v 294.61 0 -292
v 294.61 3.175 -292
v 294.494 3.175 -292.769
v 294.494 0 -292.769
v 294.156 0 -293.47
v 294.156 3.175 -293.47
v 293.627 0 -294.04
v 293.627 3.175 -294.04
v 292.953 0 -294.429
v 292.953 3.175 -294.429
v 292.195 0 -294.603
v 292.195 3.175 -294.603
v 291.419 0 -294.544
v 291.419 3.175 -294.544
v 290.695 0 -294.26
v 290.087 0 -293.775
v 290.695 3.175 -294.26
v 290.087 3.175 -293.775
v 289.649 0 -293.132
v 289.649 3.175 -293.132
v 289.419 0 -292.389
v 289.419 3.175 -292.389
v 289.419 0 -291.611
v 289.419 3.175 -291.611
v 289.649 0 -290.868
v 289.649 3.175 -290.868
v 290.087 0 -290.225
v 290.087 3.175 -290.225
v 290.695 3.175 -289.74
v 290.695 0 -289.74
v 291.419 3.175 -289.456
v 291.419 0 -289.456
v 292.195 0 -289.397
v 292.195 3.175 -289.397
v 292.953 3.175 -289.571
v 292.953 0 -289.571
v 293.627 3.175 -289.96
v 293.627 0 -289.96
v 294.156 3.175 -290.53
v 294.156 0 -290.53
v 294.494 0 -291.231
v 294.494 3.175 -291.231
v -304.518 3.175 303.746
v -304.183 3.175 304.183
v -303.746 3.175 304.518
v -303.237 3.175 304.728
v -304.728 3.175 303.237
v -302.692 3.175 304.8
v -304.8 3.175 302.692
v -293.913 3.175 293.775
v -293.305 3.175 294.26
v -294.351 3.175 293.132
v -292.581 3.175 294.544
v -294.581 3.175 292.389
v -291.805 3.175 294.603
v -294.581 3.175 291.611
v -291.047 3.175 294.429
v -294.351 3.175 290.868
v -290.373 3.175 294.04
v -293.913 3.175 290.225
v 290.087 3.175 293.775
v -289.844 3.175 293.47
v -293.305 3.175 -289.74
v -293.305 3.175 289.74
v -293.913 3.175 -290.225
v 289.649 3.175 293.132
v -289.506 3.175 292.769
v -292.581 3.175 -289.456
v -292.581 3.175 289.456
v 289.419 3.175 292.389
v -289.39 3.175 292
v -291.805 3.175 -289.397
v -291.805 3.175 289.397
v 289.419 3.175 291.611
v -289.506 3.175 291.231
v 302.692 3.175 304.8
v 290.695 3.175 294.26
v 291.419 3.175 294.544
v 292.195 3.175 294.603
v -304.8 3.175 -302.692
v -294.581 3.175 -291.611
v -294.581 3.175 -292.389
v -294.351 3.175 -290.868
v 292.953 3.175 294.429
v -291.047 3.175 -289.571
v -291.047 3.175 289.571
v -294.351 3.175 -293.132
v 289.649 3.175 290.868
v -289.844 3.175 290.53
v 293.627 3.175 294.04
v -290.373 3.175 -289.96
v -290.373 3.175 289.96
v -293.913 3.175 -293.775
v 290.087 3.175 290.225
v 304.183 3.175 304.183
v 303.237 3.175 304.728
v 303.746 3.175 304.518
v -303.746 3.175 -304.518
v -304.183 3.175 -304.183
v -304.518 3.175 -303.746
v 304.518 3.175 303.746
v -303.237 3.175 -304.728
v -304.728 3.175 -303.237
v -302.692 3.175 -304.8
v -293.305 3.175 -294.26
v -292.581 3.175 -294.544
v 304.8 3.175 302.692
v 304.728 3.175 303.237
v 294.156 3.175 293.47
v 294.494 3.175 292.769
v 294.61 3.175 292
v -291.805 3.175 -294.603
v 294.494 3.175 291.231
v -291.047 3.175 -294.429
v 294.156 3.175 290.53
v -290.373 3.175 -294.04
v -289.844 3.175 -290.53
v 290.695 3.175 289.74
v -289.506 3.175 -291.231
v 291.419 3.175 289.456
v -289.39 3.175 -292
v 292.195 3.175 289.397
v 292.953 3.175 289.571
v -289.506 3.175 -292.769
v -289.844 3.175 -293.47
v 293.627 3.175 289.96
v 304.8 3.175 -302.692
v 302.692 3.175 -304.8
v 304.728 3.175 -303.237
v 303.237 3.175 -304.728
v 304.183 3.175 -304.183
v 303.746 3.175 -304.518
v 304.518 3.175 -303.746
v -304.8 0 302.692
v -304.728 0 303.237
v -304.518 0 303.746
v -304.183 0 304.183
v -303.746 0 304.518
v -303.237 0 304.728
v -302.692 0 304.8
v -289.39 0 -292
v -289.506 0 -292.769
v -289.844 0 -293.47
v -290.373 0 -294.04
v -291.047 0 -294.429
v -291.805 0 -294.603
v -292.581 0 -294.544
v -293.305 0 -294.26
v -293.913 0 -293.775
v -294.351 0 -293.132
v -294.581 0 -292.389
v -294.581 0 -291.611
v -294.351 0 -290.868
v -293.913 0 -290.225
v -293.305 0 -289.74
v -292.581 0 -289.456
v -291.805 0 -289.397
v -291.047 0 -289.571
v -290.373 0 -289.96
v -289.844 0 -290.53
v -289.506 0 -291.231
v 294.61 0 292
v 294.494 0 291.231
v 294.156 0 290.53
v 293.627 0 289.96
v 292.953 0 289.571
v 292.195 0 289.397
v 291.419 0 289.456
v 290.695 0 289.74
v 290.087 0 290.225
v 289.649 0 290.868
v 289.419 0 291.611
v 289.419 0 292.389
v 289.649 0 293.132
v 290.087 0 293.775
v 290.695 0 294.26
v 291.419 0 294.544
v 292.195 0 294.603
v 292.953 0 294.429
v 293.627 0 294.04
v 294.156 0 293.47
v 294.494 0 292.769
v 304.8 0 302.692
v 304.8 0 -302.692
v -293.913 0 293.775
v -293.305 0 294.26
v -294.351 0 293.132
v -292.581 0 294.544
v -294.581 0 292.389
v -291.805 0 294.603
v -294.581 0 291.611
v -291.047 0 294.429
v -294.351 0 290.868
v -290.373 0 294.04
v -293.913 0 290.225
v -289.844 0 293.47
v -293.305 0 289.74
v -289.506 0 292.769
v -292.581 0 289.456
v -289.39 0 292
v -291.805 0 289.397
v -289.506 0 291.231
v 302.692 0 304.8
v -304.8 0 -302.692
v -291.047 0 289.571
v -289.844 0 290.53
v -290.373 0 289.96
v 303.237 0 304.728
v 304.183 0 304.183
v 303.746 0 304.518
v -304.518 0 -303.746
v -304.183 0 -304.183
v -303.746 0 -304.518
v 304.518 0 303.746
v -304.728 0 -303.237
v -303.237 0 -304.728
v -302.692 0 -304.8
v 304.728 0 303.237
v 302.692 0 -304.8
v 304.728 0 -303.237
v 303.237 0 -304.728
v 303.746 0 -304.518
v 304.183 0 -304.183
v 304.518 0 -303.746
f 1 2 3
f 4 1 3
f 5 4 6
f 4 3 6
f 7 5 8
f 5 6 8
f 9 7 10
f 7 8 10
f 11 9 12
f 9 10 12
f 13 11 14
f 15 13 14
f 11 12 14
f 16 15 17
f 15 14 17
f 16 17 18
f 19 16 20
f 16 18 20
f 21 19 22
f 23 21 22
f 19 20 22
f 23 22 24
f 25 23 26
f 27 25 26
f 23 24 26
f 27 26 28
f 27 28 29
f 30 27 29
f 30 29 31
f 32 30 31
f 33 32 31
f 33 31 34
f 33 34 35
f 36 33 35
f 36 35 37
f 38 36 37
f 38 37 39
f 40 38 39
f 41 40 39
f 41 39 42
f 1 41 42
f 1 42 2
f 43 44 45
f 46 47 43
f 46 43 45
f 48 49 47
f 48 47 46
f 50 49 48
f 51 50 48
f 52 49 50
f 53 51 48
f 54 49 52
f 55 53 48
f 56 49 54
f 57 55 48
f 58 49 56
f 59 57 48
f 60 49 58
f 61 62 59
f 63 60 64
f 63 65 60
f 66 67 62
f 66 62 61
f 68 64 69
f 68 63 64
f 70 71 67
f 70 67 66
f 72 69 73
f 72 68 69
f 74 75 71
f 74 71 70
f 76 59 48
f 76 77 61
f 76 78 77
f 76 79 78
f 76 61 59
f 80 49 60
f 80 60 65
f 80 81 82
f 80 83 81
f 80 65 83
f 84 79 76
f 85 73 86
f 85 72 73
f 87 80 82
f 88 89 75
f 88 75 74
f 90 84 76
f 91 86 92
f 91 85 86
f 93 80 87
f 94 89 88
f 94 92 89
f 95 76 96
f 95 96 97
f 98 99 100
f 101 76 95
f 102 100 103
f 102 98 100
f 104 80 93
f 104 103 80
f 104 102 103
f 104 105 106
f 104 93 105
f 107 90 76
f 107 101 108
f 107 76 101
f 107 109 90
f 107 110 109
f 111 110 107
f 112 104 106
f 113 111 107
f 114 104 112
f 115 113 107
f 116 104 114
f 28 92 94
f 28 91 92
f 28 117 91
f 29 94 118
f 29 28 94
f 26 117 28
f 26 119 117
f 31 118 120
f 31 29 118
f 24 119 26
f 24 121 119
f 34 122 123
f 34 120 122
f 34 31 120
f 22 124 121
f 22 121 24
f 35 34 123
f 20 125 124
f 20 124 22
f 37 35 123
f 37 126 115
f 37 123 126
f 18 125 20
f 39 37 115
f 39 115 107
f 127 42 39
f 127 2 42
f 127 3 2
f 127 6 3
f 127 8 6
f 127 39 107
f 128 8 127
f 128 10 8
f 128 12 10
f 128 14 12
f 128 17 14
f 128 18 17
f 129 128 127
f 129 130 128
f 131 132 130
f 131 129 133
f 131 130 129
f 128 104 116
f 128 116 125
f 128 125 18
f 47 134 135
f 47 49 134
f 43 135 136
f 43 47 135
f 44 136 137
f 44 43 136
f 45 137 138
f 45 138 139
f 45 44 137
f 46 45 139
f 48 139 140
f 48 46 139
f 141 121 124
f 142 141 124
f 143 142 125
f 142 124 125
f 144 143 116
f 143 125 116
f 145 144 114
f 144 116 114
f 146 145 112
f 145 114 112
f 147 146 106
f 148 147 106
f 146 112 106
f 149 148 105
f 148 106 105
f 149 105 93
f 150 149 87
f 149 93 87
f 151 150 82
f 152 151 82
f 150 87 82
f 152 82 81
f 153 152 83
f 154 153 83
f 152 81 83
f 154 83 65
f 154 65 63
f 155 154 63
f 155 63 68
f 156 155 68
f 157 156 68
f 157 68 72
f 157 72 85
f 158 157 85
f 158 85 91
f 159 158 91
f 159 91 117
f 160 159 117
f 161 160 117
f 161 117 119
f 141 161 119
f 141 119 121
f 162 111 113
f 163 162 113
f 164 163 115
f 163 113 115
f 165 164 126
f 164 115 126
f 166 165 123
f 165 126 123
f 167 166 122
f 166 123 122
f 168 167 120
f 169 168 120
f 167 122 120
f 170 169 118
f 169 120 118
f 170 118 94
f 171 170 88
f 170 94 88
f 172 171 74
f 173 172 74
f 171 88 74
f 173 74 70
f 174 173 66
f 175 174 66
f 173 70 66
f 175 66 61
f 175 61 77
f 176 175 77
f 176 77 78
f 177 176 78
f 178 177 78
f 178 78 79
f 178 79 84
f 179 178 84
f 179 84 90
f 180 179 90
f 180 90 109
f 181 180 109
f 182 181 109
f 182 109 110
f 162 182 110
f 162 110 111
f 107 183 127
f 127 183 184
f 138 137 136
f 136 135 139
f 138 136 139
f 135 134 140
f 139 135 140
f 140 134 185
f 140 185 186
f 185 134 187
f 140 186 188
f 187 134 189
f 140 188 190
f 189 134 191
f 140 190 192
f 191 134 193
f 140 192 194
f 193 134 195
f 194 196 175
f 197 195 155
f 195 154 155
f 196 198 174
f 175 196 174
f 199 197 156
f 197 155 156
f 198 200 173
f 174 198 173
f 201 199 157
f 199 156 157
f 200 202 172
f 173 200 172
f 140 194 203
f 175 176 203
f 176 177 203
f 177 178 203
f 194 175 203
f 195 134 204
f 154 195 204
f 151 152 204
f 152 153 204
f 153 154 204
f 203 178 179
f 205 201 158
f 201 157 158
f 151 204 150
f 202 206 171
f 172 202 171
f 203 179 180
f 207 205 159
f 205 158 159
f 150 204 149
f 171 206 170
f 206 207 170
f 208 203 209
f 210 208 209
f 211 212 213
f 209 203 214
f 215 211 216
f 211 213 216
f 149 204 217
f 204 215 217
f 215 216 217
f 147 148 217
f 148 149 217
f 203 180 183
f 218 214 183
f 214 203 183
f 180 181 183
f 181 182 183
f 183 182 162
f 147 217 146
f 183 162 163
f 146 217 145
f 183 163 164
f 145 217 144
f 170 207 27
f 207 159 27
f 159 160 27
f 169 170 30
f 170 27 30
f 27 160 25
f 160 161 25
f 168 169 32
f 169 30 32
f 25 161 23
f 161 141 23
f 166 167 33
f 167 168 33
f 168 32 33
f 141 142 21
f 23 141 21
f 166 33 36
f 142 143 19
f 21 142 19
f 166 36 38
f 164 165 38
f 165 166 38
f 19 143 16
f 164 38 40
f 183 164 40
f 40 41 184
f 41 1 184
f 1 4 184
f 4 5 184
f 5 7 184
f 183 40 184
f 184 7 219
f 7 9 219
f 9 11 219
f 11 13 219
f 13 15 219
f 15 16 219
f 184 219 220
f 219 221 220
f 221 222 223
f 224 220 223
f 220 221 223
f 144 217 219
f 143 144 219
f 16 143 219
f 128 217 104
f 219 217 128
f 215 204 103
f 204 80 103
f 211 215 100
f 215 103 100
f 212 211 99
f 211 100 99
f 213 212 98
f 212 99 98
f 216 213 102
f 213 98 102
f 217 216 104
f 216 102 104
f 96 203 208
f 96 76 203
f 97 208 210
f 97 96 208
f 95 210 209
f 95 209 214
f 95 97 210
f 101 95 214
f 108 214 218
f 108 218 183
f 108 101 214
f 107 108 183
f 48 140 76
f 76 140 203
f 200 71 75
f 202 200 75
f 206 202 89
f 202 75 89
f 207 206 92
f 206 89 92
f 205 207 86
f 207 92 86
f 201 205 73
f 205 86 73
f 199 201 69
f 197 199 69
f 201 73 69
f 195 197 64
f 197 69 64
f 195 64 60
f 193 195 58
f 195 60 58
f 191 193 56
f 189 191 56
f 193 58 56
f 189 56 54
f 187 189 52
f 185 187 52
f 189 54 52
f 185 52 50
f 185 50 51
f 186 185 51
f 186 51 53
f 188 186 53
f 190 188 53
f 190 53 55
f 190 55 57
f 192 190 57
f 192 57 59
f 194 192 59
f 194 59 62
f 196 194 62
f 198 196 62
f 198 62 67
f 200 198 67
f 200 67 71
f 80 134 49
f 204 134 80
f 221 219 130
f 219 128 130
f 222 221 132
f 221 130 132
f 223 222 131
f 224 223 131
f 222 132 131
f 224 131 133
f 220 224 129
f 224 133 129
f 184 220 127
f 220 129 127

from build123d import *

# Parameters (mm, degrees)
SKETCH1_W                   = 609.6
SKETCH1_H                   = 609.6
SKETCH1_W_2                 = 609.399999892
SKETCH1_H_2                 = 609.399999892
BOSS_EXTRUDE2_DEPTH         = 3.175
F_5_0_2055_DIAMETER_HOLE1_D = 5.2197
FILLET1_R                   = 2.1082


with BuildPart() as part:
    # Sketch1 → Boss-Extrude2 (new body)
    with BuildSketch(Plane(origin=(0, 0, 0), x_dir=(1, 0, 0), z_dir=(0, 1, 0))):
        Rectangle(SKETCH1_W, SKETCH1_H)
        Rectangle(SKETCH1_W_2, SKETCH1_H_2, mode=Mode.SUBTRACT)
        Rectangle(SKETCH1_W_2, SKETCH1_H_2)
    extrude(amount=BOSS_EXTRUDE2_DEPTH)

    # #5 (0.2055) Diameter Hole1 (through all)
    with Locations(Plane(origin=(0, 0, 0), x_dir=(-1, 0, 0), z_dir=(0, -1, 0))):
        with Locations((-291.999999946, 291.999999946), (291.999999946, 291.999999946), (291.999999946, -291.999999946), (-291.999999946, -291.999999946)):
            Hole(F_5_0_2055_DIAMETER_HOLE1_D / 2)

    # Fillet1
    fillet1_edges = [part.edges().sort_by_distance(p)[0] for p in [
        (-304.8, 1.5875, -304.8),
        (304.8, 1.5875, -304.8),
        (304.8, 1.5875, 304.8),
        (-304.8, 1.5875, 304.8),
    ]]
    fillet(fillet1_edges, radius=FILLET1_R)


solid = part.part
